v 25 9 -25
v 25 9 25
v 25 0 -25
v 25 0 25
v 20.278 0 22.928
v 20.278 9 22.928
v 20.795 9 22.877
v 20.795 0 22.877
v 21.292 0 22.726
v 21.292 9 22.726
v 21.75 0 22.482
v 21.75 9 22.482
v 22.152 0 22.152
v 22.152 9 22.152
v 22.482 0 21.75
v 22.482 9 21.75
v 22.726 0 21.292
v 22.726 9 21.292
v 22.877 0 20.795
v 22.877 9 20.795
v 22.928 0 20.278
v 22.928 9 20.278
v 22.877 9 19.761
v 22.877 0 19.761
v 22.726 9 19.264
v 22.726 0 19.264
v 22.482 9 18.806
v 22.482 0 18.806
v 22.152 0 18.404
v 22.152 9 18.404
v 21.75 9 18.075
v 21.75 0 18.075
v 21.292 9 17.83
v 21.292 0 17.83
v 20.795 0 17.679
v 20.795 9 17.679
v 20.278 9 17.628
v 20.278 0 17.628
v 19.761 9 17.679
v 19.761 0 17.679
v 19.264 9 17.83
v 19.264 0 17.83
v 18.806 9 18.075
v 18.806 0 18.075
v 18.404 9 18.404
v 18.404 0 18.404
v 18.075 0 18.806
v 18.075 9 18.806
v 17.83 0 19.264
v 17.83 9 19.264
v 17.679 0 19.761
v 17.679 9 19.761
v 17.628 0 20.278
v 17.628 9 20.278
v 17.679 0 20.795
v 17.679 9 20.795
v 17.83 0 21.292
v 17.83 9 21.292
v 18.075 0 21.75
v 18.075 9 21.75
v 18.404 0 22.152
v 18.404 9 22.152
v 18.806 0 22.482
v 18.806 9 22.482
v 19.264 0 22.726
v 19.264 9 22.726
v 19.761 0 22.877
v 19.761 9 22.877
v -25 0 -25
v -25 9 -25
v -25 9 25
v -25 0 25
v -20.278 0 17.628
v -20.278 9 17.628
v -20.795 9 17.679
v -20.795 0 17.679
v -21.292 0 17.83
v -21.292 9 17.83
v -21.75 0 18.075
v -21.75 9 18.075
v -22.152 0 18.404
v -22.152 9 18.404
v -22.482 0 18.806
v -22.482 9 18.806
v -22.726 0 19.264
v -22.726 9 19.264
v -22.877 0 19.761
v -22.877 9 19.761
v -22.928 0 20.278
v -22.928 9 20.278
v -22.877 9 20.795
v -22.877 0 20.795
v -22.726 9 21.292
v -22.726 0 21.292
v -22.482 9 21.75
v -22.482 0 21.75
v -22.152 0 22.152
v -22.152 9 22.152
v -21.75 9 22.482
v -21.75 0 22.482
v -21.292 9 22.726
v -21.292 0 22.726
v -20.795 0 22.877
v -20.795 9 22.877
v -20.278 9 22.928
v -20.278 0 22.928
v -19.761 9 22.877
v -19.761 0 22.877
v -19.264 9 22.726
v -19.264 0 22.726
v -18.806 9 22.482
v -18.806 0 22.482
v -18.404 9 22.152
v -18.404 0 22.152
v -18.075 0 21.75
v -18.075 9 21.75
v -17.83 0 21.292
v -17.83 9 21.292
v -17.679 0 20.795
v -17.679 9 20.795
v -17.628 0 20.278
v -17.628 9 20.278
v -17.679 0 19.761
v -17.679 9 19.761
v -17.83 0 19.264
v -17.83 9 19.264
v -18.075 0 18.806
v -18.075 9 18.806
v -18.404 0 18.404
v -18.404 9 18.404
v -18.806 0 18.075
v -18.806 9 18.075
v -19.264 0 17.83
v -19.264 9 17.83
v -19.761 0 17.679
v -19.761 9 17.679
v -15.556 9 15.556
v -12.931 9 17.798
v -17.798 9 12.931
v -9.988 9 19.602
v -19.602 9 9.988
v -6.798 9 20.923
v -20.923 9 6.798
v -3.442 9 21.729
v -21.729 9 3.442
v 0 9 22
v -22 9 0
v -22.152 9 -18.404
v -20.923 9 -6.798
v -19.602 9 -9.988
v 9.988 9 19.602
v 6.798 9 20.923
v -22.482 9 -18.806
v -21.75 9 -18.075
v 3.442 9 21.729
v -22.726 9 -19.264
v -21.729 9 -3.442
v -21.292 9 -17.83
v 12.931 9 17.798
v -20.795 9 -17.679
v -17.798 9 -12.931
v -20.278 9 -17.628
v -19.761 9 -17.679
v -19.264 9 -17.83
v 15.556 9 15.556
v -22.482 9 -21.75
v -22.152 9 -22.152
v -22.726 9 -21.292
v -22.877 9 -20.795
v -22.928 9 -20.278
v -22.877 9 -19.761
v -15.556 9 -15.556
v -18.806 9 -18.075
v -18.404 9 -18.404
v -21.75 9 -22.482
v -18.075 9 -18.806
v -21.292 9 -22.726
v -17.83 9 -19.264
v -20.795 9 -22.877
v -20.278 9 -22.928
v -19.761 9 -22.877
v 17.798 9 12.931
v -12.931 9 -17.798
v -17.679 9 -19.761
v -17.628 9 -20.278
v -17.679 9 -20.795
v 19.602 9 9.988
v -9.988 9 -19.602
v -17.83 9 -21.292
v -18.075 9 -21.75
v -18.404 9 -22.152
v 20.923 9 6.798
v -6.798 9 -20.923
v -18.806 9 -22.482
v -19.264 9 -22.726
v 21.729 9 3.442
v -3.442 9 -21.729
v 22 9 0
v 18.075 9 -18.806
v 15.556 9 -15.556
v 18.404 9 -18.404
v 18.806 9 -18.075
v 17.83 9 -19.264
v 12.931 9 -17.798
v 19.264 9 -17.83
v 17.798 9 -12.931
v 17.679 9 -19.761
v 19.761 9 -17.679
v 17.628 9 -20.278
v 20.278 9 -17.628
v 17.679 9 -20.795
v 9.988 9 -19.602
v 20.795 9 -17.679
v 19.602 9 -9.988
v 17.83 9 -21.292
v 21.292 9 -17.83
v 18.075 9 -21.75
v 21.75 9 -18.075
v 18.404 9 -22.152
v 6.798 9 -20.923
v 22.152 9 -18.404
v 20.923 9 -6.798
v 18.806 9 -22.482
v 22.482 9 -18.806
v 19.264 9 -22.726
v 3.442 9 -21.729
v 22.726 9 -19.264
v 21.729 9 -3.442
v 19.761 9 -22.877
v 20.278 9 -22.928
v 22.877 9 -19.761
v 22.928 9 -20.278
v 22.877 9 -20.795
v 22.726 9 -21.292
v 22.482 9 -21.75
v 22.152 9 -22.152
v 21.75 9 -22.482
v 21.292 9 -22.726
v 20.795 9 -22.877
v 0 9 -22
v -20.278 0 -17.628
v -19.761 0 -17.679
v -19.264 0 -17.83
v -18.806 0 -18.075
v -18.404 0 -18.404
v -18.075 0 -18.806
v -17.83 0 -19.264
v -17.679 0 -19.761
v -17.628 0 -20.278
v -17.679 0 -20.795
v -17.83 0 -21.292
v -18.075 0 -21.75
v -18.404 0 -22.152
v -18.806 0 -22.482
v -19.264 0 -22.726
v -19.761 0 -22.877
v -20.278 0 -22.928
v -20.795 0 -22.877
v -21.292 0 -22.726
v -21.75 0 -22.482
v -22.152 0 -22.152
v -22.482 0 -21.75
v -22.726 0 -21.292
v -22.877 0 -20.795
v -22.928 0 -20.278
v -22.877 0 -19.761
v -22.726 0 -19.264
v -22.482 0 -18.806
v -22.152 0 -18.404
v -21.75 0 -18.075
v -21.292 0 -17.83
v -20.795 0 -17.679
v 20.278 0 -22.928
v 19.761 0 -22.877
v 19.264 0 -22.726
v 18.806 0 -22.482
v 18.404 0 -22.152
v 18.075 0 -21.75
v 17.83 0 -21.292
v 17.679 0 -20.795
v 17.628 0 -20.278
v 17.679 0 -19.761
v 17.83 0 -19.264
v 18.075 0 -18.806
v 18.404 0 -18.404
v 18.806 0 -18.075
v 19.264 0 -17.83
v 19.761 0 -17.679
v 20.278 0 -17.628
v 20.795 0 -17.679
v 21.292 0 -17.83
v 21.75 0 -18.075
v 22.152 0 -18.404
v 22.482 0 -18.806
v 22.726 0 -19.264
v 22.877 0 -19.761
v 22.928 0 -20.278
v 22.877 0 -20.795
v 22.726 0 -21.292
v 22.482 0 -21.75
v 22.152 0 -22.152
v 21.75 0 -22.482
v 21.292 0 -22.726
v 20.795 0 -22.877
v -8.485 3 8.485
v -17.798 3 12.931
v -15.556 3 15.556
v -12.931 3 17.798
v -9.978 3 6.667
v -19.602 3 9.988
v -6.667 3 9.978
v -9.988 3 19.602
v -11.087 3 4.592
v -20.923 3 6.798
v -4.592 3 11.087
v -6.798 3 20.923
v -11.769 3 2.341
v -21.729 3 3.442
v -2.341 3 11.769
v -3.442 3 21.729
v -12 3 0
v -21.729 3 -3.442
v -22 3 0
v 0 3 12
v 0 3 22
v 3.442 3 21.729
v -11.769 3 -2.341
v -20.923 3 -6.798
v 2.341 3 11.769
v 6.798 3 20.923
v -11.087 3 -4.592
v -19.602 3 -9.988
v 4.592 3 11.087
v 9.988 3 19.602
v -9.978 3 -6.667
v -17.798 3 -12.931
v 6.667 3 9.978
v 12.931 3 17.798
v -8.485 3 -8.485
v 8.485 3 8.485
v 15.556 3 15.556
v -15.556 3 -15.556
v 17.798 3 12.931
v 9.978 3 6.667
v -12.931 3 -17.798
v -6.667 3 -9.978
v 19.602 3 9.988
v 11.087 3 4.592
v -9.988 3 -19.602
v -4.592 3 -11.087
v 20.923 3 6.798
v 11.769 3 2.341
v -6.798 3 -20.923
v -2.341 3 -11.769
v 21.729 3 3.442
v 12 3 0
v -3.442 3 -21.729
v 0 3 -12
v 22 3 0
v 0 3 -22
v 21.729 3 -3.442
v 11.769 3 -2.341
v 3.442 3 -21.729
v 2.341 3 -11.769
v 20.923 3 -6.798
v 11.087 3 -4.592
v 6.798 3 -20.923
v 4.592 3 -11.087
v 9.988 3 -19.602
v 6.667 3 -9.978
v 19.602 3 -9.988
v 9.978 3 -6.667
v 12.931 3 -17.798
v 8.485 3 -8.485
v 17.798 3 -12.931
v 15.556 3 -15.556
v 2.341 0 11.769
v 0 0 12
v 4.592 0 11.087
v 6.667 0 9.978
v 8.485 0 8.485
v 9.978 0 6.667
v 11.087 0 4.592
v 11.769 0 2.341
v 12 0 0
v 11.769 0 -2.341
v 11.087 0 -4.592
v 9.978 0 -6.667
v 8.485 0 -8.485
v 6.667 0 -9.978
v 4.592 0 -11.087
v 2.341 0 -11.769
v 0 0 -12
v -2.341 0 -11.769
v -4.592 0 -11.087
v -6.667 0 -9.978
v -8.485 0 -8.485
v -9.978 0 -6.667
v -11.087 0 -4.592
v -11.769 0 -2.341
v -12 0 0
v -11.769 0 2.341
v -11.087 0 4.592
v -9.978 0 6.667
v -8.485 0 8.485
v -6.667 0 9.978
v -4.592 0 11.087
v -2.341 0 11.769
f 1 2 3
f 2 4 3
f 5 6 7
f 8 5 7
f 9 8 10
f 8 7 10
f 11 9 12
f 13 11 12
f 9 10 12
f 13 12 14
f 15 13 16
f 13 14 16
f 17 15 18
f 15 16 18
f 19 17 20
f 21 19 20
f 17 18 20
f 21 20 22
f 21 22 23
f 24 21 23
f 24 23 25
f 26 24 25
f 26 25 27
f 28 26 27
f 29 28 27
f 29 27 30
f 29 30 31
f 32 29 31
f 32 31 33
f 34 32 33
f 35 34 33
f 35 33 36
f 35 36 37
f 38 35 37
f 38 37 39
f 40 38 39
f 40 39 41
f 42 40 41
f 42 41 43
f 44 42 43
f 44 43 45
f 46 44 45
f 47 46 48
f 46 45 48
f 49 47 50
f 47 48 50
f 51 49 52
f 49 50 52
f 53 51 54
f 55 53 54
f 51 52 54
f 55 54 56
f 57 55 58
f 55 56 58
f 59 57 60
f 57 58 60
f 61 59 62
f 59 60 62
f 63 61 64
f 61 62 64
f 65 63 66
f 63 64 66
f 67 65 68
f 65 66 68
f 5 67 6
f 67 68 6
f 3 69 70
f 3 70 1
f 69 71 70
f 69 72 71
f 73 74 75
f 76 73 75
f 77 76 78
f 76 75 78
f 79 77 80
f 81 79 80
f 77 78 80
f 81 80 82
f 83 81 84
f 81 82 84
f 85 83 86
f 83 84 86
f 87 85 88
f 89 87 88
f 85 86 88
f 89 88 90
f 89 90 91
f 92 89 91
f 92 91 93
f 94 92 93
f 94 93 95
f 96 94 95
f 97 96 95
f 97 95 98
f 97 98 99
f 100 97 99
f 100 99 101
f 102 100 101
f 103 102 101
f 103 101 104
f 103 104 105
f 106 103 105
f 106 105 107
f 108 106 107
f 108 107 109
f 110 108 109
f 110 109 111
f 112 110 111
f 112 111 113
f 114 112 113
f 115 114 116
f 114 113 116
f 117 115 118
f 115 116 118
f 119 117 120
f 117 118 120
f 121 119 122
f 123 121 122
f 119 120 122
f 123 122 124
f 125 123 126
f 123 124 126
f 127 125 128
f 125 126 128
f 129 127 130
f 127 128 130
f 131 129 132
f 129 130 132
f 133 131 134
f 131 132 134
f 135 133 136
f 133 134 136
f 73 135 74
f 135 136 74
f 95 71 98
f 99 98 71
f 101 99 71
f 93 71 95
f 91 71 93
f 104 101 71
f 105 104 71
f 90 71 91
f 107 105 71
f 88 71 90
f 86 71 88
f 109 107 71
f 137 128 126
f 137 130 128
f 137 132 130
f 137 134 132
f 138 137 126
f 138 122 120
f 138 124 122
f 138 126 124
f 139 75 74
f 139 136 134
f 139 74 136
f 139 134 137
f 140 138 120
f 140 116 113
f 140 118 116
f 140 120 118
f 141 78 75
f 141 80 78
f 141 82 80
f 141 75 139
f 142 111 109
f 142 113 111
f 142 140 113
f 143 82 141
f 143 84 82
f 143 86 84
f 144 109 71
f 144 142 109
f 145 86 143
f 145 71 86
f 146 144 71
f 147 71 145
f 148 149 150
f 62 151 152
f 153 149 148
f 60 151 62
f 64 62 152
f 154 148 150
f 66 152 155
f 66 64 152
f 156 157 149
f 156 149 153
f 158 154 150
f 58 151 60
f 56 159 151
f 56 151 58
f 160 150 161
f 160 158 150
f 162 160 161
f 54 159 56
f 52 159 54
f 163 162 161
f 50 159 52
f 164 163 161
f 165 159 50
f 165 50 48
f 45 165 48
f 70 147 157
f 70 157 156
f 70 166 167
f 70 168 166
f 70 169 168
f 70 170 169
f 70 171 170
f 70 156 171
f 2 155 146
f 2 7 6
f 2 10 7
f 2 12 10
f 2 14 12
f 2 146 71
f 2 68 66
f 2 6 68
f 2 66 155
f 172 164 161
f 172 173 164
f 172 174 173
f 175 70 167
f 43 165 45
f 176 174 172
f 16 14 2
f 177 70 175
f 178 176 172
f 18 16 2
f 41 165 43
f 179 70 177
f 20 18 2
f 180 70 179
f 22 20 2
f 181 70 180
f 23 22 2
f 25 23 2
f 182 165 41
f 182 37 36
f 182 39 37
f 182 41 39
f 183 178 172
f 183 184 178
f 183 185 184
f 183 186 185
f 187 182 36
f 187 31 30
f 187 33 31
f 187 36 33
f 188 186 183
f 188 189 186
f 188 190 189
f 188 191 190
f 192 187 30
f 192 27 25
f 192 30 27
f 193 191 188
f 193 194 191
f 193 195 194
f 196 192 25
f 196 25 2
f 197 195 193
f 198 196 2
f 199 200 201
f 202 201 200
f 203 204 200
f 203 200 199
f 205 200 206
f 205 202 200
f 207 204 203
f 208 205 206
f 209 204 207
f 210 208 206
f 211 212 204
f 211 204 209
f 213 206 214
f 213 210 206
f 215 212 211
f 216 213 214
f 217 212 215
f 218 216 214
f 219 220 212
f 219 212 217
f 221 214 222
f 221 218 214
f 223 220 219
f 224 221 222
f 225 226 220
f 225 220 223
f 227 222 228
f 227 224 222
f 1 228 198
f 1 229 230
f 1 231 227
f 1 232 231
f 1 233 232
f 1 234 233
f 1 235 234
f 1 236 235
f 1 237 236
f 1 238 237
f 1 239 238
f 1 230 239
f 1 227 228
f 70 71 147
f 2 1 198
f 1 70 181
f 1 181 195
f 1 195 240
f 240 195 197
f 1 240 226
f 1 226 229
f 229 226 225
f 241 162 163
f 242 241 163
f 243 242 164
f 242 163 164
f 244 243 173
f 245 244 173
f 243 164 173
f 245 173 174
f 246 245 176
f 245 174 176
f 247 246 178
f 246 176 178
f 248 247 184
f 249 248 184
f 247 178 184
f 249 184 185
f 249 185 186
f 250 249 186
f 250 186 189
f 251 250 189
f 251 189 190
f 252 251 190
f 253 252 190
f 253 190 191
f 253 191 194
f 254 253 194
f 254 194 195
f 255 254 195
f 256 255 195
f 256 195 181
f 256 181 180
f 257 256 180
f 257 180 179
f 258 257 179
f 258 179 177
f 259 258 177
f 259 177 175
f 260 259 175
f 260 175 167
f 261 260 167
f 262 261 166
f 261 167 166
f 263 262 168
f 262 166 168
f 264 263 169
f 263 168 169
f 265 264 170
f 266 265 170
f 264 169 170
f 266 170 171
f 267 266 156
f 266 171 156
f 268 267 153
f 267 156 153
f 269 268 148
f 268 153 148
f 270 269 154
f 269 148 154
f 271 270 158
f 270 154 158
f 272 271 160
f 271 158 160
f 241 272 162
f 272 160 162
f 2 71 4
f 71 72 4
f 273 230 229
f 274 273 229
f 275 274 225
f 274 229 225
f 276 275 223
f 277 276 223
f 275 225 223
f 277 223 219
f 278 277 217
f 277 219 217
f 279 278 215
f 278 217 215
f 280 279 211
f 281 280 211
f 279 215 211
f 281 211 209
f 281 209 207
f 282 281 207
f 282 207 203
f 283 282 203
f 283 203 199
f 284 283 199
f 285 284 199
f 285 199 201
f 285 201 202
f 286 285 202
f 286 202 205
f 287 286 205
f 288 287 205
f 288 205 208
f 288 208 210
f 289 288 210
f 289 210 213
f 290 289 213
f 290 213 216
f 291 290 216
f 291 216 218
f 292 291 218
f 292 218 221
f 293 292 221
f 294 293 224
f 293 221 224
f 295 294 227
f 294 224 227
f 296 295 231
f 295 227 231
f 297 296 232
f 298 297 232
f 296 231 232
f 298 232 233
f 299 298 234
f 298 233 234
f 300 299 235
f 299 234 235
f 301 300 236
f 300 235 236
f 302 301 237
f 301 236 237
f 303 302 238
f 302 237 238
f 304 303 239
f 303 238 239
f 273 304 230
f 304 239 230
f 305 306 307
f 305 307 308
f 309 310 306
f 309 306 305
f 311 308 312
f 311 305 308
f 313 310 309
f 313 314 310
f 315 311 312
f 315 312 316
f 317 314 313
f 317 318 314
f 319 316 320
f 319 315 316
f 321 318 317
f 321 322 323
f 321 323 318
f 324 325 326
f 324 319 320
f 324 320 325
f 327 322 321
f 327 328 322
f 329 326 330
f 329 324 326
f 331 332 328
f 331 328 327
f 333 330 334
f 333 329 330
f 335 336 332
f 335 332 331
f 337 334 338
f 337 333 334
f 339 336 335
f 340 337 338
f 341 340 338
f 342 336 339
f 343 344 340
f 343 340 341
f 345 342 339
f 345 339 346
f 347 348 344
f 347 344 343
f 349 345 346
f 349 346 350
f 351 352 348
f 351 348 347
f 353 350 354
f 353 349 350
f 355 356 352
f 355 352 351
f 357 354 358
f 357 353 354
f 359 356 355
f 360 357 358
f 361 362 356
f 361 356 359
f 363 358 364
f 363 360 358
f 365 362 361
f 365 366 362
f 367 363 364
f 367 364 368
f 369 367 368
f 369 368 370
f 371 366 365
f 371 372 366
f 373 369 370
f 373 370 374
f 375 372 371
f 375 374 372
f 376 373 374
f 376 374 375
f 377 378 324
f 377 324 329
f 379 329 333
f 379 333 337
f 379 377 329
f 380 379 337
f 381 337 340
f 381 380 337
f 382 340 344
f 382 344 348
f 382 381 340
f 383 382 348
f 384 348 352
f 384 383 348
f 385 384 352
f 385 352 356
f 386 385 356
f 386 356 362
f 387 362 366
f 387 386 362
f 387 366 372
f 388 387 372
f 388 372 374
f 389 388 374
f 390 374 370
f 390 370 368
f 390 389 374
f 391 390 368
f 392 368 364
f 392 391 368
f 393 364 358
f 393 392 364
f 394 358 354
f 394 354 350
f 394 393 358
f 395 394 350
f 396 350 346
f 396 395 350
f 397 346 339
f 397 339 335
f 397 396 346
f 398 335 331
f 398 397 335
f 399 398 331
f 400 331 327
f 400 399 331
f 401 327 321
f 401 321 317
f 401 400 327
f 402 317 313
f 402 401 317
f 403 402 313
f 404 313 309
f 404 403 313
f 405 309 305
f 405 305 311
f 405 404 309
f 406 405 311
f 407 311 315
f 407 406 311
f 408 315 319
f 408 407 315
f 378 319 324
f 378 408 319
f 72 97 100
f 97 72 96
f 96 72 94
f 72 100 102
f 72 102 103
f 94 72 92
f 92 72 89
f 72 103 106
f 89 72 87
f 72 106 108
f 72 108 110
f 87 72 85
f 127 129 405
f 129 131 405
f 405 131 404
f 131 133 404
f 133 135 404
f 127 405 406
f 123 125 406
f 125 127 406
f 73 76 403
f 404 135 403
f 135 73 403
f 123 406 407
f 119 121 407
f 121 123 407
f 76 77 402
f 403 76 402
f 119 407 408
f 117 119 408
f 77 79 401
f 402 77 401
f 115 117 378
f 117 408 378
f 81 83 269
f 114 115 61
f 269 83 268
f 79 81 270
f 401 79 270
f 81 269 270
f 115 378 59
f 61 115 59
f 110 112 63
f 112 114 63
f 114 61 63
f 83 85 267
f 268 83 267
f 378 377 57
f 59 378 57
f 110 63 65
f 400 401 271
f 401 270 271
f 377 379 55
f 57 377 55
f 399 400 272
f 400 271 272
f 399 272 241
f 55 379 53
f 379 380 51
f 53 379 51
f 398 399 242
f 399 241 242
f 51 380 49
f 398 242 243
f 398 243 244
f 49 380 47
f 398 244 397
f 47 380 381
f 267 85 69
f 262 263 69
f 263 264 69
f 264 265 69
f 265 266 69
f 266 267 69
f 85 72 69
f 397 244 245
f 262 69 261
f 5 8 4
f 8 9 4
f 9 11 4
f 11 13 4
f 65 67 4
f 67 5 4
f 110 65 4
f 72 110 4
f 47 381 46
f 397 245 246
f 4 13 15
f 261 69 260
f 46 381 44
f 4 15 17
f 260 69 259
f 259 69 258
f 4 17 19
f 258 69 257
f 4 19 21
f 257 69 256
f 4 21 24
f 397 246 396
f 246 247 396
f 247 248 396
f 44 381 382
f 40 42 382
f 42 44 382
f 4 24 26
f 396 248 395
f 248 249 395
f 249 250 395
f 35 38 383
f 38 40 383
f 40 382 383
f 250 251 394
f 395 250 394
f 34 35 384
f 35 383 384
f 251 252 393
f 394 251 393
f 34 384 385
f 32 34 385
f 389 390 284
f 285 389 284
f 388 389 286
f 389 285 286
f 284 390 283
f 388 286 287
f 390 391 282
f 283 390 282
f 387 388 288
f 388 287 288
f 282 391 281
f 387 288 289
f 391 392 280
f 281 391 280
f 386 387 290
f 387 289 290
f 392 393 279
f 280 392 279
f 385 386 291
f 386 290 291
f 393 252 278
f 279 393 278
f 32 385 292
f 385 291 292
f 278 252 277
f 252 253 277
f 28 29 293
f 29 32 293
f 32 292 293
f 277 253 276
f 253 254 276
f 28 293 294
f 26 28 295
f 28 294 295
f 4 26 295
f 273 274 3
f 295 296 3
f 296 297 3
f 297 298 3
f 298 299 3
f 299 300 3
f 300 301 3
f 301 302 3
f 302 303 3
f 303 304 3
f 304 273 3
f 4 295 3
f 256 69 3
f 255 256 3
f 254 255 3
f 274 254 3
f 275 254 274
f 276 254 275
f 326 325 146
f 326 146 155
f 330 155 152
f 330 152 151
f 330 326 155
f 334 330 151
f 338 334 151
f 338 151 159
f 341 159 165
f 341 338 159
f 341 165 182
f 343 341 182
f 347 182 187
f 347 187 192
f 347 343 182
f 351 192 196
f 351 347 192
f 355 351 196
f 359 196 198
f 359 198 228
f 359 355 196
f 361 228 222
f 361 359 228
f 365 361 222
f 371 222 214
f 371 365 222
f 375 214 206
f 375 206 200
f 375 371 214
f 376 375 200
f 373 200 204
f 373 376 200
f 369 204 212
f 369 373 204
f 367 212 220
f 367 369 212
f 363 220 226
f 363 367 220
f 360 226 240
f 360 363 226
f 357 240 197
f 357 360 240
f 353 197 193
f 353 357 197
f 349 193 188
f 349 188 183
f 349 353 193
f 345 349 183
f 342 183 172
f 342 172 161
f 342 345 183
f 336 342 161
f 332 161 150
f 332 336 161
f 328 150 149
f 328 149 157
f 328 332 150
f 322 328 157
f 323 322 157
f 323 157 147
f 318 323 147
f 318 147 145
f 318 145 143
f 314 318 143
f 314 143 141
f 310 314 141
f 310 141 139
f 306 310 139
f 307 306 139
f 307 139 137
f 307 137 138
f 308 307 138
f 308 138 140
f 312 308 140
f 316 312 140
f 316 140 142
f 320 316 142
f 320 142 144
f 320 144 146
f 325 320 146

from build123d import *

# Parameters (mm, degrees)
SKETCH1_W           = 50
SKETCH1_H           = 50
SKETCH1_R           = 12
BOSS_EXTRUDE1_DEPTH = 3
SKETCH2_W           = 50
SKETCH2_H           = 50
SKETCH2_R           = 22
BOSS_EXTRUDE2_DEPTH = 6
SKETCH3_R           = 2.65
CUT_EXTRUDE1_DEPTH  = 30


with BuildPart() as part:
    # Sketch1 → Boss-Extrude1 (new body)
    with BuildSketch(Plane(origin=(0, 0, 0), x_dir=(1, 0, 0), z_dir=(0, 1, 0))):
        Rectangle(SKETCH1_W, SKETCH1_H)
        with Locations(Location((0, 0, 0), (0, 0, 270))):
            Circle(SKETCH1_R, mode=Mode.SUBTRACT)
    extrude(amount=BOSS_EXTRUDE1_DEPTH)

    # Sketch2 → Boss-Extrude2 (add)
    with BuildSketch(Plane(origin=(0, 3, 0), x_dir=(1, 0, 0), z_dir=(0, 1, 0))):
        Rectangle(SKETCH2_W, SKETCH2_H)
        with Locations(Location((0, 0, 0), (0, 0, 270))):
            Circle(SKETCH2_R, mode=Mode.SUBTRACT)
    extrude(amount=BOSS_EXTRUDE2_DEPTH)

    # Sketch3 → Cut-Extrude1 (cut)
    with BuildSketch(Plane(origin=(0, 9, 0), x_dir=(1, 0, 0), z_dir=(0, 1, 0))):
        with Locations(Location((-20.278174593, 20.278174593, 0), (0, 0, 270))):
            Circle(SKETCH3_R)
        with Locations(Location((-20.278174593, -20.278174593, 0), (0, 0, 90))):
            Circle(SKETCH3_R)
        with Locations(Location((20.278174593, -20.278174593, 0), (0, 0, 270))):
            Circle(SKETCH3_R)
        with Locations(Location((20.278174593, 20.278174593, 0), (0, 0, 90))):
            Circle(SKETCH3_R)
    extrude(amount=-CUT_EXTRUDE1_DEPTH, mode=Mode.SUBTRACT)


solid = part.part
